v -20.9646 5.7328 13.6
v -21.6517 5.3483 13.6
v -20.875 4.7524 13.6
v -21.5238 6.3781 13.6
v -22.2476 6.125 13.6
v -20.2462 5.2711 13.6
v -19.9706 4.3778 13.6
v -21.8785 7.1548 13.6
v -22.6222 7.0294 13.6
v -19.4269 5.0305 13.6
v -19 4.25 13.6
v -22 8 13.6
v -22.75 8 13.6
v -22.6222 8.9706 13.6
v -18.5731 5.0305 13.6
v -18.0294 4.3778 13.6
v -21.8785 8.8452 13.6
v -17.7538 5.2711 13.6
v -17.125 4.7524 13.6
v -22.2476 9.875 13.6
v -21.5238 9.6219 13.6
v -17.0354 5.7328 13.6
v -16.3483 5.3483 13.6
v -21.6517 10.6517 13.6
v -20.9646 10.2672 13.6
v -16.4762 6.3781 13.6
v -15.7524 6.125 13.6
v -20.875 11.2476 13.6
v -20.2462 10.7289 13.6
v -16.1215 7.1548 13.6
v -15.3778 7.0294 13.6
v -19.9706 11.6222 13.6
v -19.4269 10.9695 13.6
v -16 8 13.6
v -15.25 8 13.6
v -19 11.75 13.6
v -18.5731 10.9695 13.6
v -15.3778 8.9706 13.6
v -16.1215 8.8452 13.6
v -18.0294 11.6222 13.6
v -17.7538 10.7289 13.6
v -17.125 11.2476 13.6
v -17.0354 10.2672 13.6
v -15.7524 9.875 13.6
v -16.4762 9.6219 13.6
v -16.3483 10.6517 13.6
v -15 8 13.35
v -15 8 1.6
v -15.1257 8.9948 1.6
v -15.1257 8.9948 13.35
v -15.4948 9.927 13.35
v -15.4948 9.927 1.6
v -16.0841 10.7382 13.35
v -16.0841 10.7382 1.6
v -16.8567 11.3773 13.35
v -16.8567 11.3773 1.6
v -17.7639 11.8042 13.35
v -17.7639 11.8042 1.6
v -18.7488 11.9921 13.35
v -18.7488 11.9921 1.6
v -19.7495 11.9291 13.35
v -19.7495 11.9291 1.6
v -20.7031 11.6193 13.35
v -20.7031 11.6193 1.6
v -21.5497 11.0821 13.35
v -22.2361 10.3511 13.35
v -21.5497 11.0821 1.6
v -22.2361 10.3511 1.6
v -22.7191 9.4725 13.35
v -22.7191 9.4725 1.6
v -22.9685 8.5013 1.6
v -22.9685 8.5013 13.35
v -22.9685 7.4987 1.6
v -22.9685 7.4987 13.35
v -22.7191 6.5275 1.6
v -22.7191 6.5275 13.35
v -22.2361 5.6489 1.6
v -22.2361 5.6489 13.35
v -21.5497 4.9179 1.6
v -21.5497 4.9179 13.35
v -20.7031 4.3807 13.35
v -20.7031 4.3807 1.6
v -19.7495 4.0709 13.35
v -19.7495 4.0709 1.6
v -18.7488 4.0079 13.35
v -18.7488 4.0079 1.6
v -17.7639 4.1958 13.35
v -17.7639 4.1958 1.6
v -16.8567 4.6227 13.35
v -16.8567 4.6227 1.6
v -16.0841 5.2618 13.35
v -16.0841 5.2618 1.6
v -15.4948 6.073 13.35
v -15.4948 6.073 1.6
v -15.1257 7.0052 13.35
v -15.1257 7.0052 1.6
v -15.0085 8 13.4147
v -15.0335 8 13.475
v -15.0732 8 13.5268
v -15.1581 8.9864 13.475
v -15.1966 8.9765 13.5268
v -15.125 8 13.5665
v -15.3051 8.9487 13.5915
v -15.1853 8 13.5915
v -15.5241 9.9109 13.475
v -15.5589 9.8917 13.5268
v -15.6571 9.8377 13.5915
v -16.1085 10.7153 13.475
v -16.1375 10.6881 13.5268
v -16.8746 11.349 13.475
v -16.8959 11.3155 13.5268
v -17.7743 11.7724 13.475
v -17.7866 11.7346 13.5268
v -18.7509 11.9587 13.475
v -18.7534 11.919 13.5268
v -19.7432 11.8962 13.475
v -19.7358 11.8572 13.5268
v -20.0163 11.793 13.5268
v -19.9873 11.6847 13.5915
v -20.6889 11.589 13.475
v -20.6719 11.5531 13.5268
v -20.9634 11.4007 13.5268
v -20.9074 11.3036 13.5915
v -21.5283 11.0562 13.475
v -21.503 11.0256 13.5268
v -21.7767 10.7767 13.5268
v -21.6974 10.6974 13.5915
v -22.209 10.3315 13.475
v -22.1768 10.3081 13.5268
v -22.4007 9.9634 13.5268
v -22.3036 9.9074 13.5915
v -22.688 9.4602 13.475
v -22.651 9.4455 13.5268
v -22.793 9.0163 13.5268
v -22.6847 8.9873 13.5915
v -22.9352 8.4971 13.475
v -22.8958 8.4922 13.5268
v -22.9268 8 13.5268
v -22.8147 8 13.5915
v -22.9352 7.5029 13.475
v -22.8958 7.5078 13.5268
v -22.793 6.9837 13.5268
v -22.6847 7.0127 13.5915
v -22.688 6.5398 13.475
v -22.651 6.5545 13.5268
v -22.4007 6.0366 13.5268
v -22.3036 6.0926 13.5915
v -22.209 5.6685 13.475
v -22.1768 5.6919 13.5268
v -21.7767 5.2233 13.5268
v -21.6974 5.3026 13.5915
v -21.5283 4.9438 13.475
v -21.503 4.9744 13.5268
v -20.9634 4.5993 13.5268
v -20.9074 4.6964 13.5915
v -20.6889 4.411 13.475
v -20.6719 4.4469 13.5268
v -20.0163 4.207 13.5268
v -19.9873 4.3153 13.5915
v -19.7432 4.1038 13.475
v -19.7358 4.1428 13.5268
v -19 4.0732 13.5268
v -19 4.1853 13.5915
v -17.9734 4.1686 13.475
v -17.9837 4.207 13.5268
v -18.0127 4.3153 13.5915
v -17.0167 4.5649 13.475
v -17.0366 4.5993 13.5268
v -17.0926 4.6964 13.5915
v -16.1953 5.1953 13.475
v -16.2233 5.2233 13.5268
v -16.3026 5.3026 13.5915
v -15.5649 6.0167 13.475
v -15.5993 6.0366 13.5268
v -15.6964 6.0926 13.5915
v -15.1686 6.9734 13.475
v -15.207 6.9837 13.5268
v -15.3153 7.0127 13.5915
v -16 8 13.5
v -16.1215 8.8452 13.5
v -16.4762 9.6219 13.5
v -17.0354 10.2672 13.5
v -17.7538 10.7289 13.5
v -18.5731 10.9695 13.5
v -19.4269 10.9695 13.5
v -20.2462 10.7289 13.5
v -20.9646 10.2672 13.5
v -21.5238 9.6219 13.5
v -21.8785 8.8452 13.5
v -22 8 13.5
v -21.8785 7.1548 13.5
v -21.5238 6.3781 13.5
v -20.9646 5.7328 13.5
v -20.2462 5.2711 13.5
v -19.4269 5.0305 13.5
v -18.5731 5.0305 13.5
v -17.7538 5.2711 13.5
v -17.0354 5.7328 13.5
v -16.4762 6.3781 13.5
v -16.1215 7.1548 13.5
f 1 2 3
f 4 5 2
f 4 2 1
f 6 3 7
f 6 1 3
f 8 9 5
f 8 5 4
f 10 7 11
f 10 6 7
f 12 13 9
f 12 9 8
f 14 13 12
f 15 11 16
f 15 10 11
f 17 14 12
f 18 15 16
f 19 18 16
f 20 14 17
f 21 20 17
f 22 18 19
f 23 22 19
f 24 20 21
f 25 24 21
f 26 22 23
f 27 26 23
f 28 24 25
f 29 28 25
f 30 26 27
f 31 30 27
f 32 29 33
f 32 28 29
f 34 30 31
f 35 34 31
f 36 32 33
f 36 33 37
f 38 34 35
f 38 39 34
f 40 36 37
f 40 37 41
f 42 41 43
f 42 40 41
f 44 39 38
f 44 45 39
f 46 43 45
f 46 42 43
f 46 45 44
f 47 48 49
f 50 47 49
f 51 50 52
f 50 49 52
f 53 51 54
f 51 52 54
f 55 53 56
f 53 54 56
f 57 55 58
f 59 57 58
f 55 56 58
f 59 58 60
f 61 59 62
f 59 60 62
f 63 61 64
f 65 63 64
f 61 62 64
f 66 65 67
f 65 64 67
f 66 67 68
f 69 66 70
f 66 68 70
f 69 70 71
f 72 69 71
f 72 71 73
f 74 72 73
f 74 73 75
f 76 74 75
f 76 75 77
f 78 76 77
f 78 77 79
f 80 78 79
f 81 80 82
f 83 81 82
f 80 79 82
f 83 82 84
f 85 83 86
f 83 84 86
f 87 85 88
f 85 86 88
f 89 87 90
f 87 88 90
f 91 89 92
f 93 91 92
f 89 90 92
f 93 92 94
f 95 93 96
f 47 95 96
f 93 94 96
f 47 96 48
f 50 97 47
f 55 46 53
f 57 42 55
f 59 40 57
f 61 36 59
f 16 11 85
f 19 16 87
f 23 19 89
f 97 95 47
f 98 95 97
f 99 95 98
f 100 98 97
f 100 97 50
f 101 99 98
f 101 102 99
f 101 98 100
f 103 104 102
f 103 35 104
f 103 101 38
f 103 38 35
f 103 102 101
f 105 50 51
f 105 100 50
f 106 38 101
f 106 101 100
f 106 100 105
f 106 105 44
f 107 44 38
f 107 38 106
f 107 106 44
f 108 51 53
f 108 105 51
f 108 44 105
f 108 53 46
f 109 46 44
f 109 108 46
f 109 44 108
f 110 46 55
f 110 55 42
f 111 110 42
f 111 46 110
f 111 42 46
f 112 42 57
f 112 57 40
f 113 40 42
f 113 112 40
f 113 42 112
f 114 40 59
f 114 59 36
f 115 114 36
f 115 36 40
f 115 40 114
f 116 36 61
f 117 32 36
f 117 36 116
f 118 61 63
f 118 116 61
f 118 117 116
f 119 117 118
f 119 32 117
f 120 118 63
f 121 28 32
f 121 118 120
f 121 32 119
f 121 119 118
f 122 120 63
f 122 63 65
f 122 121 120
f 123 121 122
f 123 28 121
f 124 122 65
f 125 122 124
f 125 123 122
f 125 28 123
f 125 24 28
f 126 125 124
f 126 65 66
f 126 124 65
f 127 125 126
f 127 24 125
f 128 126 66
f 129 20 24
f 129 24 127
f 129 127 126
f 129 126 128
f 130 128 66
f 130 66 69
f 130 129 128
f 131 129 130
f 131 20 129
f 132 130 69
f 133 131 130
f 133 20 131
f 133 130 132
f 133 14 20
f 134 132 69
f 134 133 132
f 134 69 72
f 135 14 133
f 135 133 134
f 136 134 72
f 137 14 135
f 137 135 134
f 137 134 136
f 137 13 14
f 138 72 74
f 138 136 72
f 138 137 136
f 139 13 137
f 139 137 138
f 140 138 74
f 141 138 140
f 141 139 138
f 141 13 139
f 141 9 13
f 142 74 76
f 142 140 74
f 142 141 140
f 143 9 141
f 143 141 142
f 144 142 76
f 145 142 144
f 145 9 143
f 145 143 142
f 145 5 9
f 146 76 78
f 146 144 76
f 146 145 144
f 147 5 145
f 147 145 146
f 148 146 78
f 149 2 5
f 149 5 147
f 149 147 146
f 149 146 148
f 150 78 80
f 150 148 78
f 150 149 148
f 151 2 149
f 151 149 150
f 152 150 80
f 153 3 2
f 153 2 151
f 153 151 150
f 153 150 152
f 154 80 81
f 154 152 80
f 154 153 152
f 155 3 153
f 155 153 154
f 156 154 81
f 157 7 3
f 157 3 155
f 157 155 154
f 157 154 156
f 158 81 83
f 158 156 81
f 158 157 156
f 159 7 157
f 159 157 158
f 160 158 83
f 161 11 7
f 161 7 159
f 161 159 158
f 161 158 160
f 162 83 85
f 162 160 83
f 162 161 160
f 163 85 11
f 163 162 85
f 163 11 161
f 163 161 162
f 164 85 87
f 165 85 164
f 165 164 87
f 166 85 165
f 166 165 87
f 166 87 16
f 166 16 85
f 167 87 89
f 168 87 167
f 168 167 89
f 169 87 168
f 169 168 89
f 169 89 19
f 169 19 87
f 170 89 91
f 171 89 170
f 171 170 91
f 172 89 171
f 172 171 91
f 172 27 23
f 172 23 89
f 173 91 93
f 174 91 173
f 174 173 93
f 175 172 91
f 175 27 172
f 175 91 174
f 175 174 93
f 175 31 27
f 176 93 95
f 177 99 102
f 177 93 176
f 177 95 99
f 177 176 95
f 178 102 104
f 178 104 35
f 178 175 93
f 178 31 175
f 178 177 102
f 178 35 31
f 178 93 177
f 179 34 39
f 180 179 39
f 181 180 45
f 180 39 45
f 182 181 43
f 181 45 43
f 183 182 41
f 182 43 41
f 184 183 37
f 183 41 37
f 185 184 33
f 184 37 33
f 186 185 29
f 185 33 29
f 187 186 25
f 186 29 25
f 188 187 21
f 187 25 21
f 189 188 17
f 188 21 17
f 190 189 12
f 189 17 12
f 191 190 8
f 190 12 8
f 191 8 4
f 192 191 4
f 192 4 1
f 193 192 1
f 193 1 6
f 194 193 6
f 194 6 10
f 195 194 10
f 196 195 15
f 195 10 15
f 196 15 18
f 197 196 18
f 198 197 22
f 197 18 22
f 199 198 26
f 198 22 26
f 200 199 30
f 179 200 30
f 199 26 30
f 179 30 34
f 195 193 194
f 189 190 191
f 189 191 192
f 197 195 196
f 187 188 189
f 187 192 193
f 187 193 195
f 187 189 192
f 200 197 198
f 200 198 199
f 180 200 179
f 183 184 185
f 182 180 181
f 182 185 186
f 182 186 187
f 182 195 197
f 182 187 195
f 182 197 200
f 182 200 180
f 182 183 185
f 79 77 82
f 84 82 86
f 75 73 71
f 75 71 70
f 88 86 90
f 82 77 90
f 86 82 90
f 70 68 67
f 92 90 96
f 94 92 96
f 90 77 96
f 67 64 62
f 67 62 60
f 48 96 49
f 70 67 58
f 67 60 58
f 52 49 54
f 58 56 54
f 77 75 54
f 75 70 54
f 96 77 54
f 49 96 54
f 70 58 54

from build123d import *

# Parameters (mm, degrees)
SKETCH006_R     = 4
PAD003_DEPTH    = 12
FILLET002_R     = 0.25
SKETCH007_R     = 3
POCKET003_DEPTH = 0.1


with BuildPart() as part:
    # Sketch006 (on Face1 of CopyFillet002) → Pad003 (new body)
    with BuildSketch(Plane.XY.offset(1.6)):
        with Locations((-19, 8)):
            Circle(SKETCH006_R)
    extrude(amount=PAD003_DEPTH)

    # Fillet002
    fillet002_edges = [part.edges().sort_by_distance(p)[0] for p in [
        (-23, 8, 13.6),
    ]]
    fillet(fillet002_edges, radius=FILLET002_R)

    # Sketch007 (on Face4 of Fillet002) → Pocket003 (cut)
    with BuildSketch(Plane.XY.offset(13.6)):
        with Locations((-19, 8)):
            Circle(SKETCH007_R)
    extrude(amount=-POCKET003_DEPTH, mode=Mode.SUBTRACT)


solid = part.part
